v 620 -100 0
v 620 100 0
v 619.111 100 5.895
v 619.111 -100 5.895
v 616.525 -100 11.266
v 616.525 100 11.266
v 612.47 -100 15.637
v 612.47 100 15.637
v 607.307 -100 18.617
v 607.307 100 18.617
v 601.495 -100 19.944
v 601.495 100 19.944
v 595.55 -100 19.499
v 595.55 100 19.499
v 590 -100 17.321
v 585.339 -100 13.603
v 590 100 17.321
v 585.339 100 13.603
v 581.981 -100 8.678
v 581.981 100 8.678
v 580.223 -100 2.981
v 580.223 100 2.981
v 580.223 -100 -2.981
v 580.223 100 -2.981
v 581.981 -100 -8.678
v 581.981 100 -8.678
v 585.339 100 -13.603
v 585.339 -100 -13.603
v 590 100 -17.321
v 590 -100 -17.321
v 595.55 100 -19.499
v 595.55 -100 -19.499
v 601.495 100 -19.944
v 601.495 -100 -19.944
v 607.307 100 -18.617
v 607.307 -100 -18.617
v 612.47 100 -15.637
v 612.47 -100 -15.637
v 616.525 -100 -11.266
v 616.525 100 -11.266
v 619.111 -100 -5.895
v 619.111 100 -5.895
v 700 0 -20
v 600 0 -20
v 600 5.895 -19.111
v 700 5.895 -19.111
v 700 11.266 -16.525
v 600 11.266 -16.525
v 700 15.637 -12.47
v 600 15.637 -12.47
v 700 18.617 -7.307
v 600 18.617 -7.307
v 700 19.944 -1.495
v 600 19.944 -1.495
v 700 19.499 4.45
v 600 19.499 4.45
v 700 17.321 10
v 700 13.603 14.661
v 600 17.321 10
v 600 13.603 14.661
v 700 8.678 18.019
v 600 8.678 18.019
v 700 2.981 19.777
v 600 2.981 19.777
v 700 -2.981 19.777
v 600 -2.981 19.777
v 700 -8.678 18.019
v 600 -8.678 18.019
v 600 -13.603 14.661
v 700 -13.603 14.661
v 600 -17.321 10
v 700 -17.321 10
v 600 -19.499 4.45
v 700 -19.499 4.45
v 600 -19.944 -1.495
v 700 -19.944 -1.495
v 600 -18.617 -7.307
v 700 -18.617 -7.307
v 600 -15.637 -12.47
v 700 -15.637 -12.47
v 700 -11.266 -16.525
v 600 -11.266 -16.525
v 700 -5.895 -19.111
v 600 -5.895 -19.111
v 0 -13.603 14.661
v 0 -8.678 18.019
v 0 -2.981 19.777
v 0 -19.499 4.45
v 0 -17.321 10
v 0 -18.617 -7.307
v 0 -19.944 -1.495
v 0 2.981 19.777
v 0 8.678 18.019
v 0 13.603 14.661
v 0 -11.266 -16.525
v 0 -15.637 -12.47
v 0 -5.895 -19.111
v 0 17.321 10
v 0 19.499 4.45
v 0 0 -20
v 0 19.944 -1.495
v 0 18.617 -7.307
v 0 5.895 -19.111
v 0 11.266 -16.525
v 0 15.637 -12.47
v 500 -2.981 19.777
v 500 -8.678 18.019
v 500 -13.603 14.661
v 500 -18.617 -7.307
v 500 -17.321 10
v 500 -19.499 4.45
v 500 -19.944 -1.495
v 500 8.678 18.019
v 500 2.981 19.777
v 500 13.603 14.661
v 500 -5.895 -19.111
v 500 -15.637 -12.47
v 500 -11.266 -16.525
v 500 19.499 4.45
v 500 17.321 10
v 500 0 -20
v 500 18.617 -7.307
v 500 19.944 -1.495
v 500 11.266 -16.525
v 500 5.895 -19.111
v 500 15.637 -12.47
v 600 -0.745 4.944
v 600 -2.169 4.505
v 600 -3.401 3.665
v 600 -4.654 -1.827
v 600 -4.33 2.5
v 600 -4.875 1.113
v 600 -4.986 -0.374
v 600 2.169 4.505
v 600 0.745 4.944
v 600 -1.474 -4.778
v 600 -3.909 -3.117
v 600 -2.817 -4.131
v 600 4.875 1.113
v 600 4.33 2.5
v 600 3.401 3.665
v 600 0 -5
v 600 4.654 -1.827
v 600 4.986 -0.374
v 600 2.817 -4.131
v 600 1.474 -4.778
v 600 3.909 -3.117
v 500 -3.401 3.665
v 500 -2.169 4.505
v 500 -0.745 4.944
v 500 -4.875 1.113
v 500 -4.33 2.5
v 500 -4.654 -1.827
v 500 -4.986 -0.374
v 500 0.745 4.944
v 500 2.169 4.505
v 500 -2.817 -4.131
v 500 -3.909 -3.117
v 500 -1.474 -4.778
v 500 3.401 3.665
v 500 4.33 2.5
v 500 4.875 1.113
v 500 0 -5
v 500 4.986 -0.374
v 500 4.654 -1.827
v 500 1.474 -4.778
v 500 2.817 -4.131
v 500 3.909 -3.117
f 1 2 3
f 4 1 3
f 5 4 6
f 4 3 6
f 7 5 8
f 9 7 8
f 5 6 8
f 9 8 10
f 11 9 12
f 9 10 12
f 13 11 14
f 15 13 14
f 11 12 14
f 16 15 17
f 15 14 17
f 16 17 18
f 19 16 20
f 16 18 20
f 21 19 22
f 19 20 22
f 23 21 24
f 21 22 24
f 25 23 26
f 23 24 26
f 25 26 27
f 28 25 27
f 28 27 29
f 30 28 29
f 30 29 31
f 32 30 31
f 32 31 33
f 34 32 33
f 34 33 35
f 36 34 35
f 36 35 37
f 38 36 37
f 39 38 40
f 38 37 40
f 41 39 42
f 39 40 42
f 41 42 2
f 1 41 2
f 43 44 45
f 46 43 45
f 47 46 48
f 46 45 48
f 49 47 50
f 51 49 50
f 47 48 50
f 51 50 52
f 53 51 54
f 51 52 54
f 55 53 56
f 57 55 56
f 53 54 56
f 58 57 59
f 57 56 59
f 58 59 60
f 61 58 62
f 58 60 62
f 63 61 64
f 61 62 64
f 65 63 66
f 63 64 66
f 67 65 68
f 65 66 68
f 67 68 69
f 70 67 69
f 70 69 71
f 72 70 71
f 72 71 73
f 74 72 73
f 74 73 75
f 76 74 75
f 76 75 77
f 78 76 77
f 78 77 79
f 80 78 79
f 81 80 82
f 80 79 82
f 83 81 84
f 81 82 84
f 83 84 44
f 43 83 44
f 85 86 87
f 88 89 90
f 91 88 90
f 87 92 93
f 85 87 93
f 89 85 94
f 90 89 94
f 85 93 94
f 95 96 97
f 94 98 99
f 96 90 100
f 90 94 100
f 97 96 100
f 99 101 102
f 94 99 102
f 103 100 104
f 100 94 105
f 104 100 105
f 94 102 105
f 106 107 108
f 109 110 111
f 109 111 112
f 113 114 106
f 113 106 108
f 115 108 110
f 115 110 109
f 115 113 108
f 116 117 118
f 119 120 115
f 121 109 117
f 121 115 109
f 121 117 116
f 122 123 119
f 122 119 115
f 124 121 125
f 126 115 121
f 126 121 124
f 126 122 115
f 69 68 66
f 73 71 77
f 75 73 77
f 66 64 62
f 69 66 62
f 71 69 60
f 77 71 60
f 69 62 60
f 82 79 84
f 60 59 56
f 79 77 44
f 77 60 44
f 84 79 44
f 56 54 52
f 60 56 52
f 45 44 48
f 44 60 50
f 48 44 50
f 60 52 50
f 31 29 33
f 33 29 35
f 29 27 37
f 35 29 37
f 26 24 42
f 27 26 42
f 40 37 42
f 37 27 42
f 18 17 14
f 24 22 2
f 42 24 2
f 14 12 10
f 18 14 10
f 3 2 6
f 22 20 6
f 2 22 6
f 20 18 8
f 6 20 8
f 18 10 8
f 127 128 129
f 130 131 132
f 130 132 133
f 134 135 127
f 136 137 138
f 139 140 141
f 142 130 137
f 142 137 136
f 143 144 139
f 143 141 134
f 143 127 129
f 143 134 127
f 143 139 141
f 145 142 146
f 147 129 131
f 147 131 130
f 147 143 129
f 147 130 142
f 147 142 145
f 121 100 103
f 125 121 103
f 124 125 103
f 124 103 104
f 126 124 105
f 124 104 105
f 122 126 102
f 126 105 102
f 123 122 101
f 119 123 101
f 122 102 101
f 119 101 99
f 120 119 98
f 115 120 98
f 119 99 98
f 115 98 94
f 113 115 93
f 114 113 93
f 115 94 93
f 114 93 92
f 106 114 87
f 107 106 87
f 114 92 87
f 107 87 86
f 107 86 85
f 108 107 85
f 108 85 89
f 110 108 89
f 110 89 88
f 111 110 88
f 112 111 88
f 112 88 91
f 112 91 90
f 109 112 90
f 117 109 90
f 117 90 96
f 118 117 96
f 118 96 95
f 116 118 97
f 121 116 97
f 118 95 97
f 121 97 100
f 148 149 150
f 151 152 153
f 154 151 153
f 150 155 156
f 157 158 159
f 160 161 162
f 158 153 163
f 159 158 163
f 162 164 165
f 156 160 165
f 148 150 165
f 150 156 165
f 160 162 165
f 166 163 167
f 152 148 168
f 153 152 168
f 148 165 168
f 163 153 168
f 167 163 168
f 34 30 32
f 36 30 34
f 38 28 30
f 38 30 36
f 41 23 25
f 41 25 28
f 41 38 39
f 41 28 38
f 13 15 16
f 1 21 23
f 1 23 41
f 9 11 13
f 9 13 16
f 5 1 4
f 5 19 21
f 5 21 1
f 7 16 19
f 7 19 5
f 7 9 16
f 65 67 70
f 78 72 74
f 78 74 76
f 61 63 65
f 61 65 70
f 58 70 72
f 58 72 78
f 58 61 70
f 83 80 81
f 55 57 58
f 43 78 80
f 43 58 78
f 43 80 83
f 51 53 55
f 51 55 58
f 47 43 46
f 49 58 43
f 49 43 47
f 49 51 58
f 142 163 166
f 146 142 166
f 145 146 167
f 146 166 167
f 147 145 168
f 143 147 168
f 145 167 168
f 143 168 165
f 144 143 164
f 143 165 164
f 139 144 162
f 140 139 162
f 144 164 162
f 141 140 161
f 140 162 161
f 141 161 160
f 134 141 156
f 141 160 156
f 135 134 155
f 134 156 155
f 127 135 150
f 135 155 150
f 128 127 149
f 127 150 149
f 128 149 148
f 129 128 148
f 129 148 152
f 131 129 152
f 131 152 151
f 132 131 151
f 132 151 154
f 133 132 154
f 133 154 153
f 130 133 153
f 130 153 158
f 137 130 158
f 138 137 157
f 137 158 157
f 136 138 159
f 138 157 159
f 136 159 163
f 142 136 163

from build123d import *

# Parameters (mm, degrees)
CYLINDER_R        = 5
CYLINDER_DEPTH    = 100
CYLINDER001_R     = 20
CYLINDER001_DEPTH = 200
CYLINDER002_R     = 20
CYLINDER002_DEPTH = 500
CYLINDER003_R     = 20
CYLINDER003_DEPTH = 100


with BuildPart() as cylinder:
    # Cylinder → Cylinder (new body)
    with BuildSketch(Plane(origin=(500, 0, 0), x_dir=(0, 0, -1), z_dir=(1, 0, 0))):
        Circle(CYLINDER_R)
    extrude(amount=CYLINDER_DEPTH)


with BuildPart() as cylinder001:
    # Cylinder001 → Cylinder001 (new body)
    with BuildSketch(Plane(origin=(600, 100, 0), x_dir=(1, 0, 0), z_dir=(0, -1, 0))):
        Circle(CYLINDER001_R)
    extrude(amount=CYLINDER001_DEPTH)


with BuildPart() as cylinder002:
    # Cylinder002 → Cylinder002 (new body)
    with BuildSketch(Plane(origin=(0, 0, 0), x_dir=(0, 0, -1), z_dir=(1, 0, 0))):
        Circle(CYLINDER002_R)
    extrude(amount=CYLINDER002_DEPTH)


with BuildPart() as cylinder003:
    # Cylinder003 → Cylinder003 (new body)
    with BuildSketch(Plane(origin=(600, 0, 0), x_dir=(0, 0, -1), z_dir=(1, 0, 0))):
        Circle(CYLINDER003_R)
    extrude(amount=CYLINDER003_DEPTH)


solid = Compound([cylinder.part, cylinder001.part, cylinder002.part, cylinder003.part])
